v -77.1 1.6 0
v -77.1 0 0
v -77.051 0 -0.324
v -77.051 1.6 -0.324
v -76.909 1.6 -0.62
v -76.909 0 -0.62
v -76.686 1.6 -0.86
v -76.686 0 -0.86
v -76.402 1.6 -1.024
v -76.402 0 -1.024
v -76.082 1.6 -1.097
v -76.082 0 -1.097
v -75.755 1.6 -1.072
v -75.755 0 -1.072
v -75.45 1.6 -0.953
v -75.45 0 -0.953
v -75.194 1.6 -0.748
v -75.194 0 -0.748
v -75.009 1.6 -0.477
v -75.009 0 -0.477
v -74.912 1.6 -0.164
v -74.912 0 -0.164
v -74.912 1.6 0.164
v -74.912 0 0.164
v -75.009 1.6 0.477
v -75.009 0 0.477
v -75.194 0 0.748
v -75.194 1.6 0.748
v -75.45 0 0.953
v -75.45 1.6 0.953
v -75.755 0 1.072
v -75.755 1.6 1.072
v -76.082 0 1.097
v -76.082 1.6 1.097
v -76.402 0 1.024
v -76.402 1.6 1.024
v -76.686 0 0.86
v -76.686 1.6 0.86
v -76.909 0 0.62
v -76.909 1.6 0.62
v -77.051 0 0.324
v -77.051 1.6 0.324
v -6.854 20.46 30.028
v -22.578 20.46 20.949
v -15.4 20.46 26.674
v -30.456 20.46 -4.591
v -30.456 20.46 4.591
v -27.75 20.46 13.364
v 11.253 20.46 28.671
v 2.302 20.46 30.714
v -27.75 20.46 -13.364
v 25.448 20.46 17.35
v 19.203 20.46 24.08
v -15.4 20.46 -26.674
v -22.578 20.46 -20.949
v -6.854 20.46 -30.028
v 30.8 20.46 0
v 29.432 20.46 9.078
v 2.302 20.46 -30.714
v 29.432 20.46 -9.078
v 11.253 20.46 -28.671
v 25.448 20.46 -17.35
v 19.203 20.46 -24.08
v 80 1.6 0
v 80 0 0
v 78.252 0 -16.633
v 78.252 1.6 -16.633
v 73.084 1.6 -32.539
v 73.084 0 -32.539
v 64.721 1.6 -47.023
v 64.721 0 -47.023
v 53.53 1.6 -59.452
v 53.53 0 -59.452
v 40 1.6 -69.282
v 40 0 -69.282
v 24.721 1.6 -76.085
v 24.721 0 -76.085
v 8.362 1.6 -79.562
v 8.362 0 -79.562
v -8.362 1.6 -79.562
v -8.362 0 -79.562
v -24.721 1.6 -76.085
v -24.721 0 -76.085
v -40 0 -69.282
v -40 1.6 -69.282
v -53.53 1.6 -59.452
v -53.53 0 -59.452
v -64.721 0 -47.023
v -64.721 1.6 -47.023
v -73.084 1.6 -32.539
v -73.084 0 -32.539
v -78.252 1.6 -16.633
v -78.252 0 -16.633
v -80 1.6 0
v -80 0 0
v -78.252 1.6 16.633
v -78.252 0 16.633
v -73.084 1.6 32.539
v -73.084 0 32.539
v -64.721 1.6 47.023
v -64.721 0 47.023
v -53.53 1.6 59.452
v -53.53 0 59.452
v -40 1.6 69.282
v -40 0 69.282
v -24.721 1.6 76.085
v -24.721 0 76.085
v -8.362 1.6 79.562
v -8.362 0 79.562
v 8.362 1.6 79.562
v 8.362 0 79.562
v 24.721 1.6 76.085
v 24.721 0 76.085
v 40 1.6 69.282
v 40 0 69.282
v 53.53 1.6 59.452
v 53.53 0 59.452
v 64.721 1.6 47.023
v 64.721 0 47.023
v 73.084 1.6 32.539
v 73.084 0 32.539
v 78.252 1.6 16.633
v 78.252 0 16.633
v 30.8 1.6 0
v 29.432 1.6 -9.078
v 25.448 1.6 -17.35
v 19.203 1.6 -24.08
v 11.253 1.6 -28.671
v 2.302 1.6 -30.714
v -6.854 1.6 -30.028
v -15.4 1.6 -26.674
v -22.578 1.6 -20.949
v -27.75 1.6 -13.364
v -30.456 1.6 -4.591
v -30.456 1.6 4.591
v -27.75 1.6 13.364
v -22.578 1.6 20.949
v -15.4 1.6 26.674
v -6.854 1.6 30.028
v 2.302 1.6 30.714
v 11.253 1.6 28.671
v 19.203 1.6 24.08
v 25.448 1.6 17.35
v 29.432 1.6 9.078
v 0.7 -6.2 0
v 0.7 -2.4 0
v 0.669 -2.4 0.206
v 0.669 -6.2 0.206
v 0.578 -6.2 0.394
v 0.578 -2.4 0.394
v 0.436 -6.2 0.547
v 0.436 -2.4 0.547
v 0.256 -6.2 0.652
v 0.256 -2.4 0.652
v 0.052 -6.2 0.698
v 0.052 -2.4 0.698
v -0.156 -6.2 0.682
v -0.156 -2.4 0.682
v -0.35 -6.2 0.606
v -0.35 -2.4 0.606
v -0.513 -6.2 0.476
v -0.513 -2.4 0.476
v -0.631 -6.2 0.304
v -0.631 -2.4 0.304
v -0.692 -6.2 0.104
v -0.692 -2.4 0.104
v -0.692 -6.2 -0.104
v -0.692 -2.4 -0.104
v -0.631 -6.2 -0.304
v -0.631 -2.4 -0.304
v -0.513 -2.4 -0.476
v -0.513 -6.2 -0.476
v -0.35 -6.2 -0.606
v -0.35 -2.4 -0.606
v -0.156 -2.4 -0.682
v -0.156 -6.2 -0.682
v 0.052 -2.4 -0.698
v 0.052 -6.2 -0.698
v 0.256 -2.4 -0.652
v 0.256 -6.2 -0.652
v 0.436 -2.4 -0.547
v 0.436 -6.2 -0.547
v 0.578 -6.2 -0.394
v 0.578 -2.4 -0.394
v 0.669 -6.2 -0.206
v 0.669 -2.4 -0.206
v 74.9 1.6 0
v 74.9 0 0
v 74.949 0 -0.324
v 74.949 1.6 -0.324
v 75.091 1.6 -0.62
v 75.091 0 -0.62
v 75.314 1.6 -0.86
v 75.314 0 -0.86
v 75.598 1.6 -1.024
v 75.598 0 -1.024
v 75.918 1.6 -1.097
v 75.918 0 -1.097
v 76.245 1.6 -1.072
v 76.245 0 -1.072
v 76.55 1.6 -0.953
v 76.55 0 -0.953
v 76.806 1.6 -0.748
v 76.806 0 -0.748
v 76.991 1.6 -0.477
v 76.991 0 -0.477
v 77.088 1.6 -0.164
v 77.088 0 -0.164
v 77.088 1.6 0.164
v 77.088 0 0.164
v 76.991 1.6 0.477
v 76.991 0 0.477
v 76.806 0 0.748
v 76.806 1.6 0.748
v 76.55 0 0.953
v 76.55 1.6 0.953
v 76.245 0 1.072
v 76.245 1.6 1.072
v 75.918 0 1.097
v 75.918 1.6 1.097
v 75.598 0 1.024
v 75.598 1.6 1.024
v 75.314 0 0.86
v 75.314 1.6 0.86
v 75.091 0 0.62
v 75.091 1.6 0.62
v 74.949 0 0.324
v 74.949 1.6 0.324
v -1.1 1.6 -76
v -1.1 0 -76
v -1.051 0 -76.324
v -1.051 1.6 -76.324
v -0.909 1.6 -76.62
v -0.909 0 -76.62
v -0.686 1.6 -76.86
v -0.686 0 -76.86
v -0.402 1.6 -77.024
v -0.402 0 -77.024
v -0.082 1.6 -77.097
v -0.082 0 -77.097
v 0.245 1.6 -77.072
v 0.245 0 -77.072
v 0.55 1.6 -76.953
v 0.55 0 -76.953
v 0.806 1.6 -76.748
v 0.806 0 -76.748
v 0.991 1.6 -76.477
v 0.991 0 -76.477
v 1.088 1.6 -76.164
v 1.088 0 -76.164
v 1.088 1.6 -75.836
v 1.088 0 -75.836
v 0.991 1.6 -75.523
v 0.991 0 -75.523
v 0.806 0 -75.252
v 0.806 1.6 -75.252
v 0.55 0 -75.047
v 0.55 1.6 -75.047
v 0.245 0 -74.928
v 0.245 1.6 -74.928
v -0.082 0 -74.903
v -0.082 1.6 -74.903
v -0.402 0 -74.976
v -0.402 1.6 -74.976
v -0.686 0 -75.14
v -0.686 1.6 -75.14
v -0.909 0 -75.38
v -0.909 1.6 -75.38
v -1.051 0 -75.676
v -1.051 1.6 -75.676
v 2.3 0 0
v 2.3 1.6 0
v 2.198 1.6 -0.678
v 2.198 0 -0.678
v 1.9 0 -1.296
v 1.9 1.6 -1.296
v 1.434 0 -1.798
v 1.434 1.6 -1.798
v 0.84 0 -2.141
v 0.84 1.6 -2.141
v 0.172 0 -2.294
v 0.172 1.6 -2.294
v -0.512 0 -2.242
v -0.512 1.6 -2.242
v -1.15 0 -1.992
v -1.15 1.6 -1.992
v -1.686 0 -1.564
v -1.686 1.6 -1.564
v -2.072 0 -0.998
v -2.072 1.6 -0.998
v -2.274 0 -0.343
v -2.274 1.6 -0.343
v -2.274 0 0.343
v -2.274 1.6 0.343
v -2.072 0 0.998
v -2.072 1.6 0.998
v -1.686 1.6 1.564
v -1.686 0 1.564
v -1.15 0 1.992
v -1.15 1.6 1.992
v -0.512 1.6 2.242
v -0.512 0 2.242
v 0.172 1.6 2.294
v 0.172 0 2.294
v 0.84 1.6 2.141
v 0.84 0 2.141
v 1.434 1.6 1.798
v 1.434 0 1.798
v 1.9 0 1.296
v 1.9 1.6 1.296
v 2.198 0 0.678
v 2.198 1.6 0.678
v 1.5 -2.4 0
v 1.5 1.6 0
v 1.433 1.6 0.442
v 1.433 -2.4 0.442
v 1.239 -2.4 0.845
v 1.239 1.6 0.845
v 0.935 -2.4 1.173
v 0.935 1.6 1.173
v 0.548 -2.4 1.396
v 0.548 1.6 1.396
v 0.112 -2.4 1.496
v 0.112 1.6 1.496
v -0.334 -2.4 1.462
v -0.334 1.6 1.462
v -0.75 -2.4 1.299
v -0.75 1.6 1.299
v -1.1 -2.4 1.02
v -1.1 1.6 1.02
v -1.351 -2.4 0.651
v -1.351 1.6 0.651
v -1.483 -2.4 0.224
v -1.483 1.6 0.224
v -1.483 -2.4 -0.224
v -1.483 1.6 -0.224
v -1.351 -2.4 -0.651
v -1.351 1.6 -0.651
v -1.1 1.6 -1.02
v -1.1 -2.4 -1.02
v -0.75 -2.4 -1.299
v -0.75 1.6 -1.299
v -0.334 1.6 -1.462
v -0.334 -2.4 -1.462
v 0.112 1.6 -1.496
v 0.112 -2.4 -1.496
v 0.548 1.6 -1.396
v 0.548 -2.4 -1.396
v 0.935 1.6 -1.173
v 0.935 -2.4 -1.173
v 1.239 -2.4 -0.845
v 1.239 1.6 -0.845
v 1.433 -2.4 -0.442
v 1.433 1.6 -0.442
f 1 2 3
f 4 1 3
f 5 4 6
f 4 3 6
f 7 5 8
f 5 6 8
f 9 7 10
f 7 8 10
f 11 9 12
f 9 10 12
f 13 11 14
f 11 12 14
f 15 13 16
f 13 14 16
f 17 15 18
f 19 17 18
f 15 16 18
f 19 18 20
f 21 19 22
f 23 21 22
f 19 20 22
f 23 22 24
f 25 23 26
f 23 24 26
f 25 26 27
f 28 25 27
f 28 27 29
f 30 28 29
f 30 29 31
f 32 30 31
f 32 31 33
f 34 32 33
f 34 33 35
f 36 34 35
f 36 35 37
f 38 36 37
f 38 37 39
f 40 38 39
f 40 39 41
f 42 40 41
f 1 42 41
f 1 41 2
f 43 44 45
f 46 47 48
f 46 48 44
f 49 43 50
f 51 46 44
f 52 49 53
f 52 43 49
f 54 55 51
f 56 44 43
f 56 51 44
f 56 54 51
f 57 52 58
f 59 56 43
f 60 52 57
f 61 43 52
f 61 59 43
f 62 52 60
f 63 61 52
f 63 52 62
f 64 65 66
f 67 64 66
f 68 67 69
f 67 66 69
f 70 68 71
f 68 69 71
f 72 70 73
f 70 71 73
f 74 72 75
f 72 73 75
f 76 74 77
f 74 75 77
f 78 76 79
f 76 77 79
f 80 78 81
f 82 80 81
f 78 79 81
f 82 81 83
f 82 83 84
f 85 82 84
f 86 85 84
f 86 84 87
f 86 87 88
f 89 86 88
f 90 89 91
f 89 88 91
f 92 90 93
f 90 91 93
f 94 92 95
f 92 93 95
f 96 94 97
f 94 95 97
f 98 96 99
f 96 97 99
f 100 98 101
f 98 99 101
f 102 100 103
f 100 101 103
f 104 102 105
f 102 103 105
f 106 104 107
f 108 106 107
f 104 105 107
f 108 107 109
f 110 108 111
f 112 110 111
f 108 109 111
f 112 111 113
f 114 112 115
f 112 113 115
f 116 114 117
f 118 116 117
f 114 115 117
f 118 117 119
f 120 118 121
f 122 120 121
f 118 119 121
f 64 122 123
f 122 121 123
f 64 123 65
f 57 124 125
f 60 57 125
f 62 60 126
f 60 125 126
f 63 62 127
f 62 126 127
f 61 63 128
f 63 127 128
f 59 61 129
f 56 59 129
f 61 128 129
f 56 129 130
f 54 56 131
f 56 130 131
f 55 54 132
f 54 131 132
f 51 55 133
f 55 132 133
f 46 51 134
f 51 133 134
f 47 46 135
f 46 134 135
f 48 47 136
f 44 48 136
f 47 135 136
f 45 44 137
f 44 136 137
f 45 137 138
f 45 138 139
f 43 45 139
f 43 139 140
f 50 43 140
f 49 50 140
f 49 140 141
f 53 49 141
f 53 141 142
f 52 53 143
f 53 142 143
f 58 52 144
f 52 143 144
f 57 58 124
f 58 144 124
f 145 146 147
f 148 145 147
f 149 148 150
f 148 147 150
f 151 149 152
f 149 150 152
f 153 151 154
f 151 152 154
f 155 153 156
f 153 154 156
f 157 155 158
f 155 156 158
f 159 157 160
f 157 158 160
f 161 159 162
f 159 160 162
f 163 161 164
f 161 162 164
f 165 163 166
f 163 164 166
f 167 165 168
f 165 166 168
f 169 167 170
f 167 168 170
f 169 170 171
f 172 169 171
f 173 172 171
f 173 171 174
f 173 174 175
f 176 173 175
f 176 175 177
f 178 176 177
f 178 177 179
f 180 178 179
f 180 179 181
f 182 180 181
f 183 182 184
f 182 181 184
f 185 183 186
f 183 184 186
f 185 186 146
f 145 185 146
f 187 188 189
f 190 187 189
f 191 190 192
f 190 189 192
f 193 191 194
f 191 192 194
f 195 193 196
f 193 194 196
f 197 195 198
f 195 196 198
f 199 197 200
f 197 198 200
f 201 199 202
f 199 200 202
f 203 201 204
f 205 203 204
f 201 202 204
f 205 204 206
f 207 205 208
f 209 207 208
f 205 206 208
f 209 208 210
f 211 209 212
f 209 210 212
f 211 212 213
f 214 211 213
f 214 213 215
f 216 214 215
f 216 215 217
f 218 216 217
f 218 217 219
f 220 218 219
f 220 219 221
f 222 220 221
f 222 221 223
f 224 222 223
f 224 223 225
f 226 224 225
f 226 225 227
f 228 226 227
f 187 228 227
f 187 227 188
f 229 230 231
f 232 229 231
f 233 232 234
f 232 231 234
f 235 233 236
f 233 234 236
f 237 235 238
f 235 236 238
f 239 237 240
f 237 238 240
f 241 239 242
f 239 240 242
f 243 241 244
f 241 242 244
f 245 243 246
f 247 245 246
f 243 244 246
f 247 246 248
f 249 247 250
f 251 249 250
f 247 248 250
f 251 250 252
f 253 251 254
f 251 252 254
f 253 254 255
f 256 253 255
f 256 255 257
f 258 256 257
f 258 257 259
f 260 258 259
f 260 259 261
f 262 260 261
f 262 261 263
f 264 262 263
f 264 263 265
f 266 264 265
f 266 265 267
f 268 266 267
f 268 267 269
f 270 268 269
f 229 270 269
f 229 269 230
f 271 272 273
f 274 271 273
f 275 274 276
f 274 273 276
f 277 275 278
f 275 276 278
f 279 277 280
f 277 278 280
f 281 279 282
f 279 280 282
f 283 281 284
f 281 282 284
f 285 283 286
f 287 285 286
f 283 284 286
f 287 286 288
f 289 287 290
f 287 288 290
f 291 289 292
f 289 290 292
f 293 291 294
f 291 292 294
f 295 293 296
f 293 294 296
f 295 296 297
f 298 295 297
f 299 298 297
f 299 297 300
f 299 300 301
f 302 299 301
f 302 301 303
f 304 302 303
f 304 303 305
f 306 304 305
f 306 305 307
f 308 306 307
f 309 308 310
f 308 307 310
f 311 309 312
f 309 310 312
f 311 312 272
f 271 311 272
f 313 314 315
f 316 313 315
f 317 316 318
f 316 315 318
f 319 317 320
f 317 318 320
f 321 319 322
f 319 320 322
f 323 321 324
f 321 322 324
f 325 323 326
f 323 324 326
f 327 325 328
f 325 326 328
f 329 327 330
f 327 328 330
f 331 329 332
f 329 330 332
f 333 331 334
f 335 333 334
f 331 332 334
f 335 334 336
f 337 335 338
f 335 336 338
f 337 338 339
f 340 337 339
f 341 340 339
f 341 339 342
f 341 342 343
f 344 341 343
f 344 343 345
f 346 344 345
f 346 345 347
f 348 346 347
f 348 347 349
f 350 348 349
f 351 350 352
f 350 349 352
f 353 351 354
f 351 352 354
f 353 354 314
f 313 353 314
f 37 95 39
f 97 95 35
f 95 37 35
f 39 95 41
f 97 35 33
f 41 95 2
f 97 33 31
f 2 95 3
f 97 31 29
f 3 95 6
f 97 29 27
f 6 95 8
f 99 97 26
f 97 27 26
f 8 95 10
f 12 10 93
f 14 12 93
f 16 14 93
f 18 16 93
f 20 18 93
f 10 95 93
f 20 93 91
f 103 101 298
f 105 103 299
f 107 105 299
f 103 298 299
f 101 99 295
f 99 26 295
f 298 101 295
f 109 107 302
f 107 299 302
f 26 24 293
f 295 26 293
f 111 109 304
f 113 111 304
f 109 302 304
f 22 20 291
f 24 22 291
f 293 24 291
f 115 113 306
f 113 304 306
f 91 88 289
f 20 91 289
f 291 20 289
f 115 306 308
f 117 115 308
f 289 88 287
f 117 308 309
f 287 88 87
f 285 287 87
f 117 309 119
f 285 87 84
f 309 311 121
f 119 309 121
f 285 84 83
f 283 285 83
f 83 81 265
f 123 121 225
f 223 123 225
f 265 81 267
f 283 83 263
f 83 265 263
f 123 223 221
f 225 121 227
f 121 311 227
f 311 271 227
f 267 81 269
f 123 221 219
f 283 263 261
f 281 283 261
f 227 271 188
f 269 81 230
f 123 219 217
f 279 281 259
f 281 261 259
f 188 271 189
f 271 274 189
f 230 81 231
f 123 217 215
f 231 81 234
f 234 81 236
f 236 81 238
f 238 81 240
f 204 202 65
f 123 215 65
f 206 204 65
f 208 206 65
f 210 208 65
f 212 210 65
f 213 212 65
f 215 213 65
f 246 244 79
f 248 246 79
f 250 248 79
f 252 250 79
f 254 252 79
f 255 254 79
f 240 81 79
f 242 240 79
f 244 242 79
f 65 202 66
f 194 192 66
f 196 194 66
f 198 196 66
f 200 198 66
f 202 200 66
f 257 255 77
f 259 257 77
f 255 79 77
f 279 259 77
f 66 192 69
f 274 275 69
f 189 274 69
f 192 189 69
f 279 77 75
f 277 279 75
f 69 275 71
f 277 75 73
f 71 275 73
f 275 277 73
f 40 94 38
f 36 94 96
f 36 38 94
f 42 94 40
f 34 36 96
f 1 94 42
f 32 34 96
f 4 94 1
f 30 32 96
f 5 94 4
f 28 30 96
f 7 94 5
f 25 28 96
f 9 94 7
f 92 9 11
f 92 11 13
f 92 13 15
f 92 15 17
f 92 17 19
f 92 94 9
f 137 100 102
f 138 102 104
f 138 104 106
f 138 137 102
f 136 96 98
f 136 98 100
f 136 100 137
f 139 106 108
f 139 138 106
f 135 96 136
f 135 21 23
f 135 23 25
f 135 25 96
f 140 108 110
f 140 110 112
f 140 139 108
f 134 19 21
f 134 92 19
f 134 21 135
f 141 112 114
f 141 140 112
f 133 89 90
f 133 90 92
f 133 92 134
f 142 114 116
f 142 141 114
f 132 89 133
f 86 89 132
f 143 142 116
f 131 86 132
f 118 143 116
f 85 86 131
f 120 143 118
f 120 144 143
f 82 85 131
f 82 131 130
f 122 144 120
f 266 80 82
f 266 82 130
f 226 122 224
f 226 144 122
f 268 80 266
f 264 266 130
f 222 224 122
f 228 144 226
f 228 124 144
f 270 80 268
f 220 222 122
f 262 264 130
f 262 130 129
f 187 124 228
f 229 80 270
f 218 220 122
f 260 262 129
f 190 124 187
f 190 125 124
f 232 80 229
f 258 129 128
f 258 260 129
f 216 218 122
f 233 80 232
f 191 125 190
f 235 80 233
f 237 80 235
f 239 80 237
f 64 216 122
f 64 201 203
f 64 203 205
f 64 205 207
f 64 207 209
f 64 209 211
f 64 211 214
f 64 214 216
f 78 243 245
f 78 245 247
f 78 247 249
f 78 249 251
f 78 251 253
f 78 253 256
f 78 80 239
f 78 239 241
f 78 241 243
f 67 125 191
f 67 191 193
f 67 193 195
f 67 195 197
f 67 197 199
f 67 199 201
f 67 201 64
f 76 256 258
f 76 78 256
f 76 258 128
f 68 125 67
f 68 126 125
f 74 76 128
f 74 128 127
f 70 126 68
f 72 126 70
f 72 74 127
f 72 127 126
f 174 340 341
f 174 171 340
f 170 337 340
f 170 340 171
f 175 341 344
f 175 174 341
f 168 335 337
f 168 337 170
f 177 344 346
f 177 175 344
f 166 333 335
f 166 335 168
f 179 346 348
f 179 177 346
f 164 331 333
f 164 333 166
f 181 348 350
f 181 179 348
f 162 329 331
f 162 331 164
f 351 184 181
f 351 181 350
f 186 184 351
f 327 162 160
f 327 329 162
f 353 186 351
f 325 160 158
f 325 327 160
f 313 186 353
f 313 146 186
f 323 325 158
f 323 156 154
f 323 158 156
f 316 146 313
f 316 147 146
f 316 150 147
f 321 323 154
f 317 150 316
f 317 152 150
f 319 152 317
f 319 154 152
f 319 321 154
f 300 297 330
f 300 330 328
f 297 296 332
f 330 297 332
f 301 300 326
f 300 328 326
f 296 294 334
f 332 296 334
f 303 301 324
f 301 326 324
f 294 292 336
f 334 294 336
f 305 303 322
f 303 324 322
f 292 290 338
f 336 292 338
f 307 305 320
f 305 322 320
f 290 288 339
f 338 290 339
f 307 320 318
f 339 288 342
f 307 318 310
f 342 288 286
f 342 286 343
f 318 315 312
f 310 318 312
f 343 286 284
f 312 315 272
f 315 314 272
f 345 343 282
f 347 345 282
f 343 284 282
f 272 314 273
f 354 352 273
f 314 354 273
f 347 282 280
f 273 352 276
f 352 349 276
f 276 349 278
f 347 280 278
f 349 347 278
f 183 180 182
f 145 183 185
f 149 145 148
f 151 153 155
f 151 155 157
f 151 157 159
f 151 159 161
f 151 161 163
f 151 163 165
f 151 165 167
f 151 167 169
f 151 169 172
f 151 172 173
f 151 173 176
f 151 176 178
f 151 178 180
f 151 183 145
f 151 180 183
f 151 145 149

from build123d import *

# Parameters (mm, degrees)
SKETCH1_R                = 80
BOSS_EXTRUDE1_DEPTH      = 1.6
SKETCH2_R                = 2.3
CUT_EXTRUDE1_DEPTH       = 1.6
M2_CLEARANCE_HOLE2_D     = 2.2
M2_CLEARANCE_HOLE2_DEPTH = 6
M2_CLEARANCE_HOLE2_TIP   = 0.660946681
SKETCH9_R                = 30.8
BOSS_EXTRUDE2_DEPTH      = 18.86
SKETCH10_R               = 1.5
BOSS_EXTRUDE3_DEPTH      = 4
SKETCH11_R               = 0.7
BOSS_EXTRUDE4_DEPTH      = 3.8


with BuildPart() as part:
    # Sketch1 → Boss-Extrude1 (new body)
    with BuildSketch(Plane(origin=(0, 0, 0), x_dir=(1, 0, 0), z_dir=(0, 1, 0))):
        Circle(SKETCH1_R)
    extrude(amount=BOSS_EXTRUDE1_DEPTH)

    # Sketch2 → Cut-Extrude1 (cut)
    with BuildSketch(Plane(origin=(0, 1.6, 0), x_dir=(1, 0, 0), z_dir=(0, 1, 0))):
        Circle(SKETCH2_R)
    extrude(amount=-CUT_EXTRUDE1_DEPTH, mode=Mode.SUBTRACT)

    # M2 Clearance Hole2
    with Locations(Plane(origin=(0, 1.6, 0), x_dir=(1, 0, 0), z_dir=(0, 1, 0))):
        with Locations((0, 76), (76, 0), (-76, 0)):
            Hole(M2_CLEARANCE_HOLE2_D / 2, depth=M2_CLEARANCE_HOLE2_DEPTH)
            with Locations((0, 0, -(M2_CLEARANCE_HOLE2_DEPTH + M2_CLEARANCE_HOLE2_TIP / 2))):  # 118° drill point
                Cone(0, M2_CLEARANCE_HOLE2_D / 2, M2_CLEARANCE_HOLE2_TIP, mode=Mode.SUBTRACT)

    # Sketch9 → Boss-Extrude2 (add)
    with BuildSketch(Plane(origin=(0, 1.6, 0), x_dir=(1, 0, 0), z_dir=(0, 1, 0))):
        Circle(SKETCH9_R)
    extrude(amount=BOSS_EXTRUDE2_DEPTH)

    # Sketch10 → Boss-Extrude3 (add)
    with BuildSketch(Plane.XZ.offset(-1.6)):
        Circle(SKETCH10_R)
    extrude(amount=BOSS_EXTRUDE3_DEPTH)

    # Sketch11 → Boss-Extrude4 (add)
    with BuildSketch(Plane.XZ.offset(2.4)):
        Circle(SKETCH11_R)
    extrude(amount=BOSS_EXTRUDE4_DEPTH)


solid = part.part
